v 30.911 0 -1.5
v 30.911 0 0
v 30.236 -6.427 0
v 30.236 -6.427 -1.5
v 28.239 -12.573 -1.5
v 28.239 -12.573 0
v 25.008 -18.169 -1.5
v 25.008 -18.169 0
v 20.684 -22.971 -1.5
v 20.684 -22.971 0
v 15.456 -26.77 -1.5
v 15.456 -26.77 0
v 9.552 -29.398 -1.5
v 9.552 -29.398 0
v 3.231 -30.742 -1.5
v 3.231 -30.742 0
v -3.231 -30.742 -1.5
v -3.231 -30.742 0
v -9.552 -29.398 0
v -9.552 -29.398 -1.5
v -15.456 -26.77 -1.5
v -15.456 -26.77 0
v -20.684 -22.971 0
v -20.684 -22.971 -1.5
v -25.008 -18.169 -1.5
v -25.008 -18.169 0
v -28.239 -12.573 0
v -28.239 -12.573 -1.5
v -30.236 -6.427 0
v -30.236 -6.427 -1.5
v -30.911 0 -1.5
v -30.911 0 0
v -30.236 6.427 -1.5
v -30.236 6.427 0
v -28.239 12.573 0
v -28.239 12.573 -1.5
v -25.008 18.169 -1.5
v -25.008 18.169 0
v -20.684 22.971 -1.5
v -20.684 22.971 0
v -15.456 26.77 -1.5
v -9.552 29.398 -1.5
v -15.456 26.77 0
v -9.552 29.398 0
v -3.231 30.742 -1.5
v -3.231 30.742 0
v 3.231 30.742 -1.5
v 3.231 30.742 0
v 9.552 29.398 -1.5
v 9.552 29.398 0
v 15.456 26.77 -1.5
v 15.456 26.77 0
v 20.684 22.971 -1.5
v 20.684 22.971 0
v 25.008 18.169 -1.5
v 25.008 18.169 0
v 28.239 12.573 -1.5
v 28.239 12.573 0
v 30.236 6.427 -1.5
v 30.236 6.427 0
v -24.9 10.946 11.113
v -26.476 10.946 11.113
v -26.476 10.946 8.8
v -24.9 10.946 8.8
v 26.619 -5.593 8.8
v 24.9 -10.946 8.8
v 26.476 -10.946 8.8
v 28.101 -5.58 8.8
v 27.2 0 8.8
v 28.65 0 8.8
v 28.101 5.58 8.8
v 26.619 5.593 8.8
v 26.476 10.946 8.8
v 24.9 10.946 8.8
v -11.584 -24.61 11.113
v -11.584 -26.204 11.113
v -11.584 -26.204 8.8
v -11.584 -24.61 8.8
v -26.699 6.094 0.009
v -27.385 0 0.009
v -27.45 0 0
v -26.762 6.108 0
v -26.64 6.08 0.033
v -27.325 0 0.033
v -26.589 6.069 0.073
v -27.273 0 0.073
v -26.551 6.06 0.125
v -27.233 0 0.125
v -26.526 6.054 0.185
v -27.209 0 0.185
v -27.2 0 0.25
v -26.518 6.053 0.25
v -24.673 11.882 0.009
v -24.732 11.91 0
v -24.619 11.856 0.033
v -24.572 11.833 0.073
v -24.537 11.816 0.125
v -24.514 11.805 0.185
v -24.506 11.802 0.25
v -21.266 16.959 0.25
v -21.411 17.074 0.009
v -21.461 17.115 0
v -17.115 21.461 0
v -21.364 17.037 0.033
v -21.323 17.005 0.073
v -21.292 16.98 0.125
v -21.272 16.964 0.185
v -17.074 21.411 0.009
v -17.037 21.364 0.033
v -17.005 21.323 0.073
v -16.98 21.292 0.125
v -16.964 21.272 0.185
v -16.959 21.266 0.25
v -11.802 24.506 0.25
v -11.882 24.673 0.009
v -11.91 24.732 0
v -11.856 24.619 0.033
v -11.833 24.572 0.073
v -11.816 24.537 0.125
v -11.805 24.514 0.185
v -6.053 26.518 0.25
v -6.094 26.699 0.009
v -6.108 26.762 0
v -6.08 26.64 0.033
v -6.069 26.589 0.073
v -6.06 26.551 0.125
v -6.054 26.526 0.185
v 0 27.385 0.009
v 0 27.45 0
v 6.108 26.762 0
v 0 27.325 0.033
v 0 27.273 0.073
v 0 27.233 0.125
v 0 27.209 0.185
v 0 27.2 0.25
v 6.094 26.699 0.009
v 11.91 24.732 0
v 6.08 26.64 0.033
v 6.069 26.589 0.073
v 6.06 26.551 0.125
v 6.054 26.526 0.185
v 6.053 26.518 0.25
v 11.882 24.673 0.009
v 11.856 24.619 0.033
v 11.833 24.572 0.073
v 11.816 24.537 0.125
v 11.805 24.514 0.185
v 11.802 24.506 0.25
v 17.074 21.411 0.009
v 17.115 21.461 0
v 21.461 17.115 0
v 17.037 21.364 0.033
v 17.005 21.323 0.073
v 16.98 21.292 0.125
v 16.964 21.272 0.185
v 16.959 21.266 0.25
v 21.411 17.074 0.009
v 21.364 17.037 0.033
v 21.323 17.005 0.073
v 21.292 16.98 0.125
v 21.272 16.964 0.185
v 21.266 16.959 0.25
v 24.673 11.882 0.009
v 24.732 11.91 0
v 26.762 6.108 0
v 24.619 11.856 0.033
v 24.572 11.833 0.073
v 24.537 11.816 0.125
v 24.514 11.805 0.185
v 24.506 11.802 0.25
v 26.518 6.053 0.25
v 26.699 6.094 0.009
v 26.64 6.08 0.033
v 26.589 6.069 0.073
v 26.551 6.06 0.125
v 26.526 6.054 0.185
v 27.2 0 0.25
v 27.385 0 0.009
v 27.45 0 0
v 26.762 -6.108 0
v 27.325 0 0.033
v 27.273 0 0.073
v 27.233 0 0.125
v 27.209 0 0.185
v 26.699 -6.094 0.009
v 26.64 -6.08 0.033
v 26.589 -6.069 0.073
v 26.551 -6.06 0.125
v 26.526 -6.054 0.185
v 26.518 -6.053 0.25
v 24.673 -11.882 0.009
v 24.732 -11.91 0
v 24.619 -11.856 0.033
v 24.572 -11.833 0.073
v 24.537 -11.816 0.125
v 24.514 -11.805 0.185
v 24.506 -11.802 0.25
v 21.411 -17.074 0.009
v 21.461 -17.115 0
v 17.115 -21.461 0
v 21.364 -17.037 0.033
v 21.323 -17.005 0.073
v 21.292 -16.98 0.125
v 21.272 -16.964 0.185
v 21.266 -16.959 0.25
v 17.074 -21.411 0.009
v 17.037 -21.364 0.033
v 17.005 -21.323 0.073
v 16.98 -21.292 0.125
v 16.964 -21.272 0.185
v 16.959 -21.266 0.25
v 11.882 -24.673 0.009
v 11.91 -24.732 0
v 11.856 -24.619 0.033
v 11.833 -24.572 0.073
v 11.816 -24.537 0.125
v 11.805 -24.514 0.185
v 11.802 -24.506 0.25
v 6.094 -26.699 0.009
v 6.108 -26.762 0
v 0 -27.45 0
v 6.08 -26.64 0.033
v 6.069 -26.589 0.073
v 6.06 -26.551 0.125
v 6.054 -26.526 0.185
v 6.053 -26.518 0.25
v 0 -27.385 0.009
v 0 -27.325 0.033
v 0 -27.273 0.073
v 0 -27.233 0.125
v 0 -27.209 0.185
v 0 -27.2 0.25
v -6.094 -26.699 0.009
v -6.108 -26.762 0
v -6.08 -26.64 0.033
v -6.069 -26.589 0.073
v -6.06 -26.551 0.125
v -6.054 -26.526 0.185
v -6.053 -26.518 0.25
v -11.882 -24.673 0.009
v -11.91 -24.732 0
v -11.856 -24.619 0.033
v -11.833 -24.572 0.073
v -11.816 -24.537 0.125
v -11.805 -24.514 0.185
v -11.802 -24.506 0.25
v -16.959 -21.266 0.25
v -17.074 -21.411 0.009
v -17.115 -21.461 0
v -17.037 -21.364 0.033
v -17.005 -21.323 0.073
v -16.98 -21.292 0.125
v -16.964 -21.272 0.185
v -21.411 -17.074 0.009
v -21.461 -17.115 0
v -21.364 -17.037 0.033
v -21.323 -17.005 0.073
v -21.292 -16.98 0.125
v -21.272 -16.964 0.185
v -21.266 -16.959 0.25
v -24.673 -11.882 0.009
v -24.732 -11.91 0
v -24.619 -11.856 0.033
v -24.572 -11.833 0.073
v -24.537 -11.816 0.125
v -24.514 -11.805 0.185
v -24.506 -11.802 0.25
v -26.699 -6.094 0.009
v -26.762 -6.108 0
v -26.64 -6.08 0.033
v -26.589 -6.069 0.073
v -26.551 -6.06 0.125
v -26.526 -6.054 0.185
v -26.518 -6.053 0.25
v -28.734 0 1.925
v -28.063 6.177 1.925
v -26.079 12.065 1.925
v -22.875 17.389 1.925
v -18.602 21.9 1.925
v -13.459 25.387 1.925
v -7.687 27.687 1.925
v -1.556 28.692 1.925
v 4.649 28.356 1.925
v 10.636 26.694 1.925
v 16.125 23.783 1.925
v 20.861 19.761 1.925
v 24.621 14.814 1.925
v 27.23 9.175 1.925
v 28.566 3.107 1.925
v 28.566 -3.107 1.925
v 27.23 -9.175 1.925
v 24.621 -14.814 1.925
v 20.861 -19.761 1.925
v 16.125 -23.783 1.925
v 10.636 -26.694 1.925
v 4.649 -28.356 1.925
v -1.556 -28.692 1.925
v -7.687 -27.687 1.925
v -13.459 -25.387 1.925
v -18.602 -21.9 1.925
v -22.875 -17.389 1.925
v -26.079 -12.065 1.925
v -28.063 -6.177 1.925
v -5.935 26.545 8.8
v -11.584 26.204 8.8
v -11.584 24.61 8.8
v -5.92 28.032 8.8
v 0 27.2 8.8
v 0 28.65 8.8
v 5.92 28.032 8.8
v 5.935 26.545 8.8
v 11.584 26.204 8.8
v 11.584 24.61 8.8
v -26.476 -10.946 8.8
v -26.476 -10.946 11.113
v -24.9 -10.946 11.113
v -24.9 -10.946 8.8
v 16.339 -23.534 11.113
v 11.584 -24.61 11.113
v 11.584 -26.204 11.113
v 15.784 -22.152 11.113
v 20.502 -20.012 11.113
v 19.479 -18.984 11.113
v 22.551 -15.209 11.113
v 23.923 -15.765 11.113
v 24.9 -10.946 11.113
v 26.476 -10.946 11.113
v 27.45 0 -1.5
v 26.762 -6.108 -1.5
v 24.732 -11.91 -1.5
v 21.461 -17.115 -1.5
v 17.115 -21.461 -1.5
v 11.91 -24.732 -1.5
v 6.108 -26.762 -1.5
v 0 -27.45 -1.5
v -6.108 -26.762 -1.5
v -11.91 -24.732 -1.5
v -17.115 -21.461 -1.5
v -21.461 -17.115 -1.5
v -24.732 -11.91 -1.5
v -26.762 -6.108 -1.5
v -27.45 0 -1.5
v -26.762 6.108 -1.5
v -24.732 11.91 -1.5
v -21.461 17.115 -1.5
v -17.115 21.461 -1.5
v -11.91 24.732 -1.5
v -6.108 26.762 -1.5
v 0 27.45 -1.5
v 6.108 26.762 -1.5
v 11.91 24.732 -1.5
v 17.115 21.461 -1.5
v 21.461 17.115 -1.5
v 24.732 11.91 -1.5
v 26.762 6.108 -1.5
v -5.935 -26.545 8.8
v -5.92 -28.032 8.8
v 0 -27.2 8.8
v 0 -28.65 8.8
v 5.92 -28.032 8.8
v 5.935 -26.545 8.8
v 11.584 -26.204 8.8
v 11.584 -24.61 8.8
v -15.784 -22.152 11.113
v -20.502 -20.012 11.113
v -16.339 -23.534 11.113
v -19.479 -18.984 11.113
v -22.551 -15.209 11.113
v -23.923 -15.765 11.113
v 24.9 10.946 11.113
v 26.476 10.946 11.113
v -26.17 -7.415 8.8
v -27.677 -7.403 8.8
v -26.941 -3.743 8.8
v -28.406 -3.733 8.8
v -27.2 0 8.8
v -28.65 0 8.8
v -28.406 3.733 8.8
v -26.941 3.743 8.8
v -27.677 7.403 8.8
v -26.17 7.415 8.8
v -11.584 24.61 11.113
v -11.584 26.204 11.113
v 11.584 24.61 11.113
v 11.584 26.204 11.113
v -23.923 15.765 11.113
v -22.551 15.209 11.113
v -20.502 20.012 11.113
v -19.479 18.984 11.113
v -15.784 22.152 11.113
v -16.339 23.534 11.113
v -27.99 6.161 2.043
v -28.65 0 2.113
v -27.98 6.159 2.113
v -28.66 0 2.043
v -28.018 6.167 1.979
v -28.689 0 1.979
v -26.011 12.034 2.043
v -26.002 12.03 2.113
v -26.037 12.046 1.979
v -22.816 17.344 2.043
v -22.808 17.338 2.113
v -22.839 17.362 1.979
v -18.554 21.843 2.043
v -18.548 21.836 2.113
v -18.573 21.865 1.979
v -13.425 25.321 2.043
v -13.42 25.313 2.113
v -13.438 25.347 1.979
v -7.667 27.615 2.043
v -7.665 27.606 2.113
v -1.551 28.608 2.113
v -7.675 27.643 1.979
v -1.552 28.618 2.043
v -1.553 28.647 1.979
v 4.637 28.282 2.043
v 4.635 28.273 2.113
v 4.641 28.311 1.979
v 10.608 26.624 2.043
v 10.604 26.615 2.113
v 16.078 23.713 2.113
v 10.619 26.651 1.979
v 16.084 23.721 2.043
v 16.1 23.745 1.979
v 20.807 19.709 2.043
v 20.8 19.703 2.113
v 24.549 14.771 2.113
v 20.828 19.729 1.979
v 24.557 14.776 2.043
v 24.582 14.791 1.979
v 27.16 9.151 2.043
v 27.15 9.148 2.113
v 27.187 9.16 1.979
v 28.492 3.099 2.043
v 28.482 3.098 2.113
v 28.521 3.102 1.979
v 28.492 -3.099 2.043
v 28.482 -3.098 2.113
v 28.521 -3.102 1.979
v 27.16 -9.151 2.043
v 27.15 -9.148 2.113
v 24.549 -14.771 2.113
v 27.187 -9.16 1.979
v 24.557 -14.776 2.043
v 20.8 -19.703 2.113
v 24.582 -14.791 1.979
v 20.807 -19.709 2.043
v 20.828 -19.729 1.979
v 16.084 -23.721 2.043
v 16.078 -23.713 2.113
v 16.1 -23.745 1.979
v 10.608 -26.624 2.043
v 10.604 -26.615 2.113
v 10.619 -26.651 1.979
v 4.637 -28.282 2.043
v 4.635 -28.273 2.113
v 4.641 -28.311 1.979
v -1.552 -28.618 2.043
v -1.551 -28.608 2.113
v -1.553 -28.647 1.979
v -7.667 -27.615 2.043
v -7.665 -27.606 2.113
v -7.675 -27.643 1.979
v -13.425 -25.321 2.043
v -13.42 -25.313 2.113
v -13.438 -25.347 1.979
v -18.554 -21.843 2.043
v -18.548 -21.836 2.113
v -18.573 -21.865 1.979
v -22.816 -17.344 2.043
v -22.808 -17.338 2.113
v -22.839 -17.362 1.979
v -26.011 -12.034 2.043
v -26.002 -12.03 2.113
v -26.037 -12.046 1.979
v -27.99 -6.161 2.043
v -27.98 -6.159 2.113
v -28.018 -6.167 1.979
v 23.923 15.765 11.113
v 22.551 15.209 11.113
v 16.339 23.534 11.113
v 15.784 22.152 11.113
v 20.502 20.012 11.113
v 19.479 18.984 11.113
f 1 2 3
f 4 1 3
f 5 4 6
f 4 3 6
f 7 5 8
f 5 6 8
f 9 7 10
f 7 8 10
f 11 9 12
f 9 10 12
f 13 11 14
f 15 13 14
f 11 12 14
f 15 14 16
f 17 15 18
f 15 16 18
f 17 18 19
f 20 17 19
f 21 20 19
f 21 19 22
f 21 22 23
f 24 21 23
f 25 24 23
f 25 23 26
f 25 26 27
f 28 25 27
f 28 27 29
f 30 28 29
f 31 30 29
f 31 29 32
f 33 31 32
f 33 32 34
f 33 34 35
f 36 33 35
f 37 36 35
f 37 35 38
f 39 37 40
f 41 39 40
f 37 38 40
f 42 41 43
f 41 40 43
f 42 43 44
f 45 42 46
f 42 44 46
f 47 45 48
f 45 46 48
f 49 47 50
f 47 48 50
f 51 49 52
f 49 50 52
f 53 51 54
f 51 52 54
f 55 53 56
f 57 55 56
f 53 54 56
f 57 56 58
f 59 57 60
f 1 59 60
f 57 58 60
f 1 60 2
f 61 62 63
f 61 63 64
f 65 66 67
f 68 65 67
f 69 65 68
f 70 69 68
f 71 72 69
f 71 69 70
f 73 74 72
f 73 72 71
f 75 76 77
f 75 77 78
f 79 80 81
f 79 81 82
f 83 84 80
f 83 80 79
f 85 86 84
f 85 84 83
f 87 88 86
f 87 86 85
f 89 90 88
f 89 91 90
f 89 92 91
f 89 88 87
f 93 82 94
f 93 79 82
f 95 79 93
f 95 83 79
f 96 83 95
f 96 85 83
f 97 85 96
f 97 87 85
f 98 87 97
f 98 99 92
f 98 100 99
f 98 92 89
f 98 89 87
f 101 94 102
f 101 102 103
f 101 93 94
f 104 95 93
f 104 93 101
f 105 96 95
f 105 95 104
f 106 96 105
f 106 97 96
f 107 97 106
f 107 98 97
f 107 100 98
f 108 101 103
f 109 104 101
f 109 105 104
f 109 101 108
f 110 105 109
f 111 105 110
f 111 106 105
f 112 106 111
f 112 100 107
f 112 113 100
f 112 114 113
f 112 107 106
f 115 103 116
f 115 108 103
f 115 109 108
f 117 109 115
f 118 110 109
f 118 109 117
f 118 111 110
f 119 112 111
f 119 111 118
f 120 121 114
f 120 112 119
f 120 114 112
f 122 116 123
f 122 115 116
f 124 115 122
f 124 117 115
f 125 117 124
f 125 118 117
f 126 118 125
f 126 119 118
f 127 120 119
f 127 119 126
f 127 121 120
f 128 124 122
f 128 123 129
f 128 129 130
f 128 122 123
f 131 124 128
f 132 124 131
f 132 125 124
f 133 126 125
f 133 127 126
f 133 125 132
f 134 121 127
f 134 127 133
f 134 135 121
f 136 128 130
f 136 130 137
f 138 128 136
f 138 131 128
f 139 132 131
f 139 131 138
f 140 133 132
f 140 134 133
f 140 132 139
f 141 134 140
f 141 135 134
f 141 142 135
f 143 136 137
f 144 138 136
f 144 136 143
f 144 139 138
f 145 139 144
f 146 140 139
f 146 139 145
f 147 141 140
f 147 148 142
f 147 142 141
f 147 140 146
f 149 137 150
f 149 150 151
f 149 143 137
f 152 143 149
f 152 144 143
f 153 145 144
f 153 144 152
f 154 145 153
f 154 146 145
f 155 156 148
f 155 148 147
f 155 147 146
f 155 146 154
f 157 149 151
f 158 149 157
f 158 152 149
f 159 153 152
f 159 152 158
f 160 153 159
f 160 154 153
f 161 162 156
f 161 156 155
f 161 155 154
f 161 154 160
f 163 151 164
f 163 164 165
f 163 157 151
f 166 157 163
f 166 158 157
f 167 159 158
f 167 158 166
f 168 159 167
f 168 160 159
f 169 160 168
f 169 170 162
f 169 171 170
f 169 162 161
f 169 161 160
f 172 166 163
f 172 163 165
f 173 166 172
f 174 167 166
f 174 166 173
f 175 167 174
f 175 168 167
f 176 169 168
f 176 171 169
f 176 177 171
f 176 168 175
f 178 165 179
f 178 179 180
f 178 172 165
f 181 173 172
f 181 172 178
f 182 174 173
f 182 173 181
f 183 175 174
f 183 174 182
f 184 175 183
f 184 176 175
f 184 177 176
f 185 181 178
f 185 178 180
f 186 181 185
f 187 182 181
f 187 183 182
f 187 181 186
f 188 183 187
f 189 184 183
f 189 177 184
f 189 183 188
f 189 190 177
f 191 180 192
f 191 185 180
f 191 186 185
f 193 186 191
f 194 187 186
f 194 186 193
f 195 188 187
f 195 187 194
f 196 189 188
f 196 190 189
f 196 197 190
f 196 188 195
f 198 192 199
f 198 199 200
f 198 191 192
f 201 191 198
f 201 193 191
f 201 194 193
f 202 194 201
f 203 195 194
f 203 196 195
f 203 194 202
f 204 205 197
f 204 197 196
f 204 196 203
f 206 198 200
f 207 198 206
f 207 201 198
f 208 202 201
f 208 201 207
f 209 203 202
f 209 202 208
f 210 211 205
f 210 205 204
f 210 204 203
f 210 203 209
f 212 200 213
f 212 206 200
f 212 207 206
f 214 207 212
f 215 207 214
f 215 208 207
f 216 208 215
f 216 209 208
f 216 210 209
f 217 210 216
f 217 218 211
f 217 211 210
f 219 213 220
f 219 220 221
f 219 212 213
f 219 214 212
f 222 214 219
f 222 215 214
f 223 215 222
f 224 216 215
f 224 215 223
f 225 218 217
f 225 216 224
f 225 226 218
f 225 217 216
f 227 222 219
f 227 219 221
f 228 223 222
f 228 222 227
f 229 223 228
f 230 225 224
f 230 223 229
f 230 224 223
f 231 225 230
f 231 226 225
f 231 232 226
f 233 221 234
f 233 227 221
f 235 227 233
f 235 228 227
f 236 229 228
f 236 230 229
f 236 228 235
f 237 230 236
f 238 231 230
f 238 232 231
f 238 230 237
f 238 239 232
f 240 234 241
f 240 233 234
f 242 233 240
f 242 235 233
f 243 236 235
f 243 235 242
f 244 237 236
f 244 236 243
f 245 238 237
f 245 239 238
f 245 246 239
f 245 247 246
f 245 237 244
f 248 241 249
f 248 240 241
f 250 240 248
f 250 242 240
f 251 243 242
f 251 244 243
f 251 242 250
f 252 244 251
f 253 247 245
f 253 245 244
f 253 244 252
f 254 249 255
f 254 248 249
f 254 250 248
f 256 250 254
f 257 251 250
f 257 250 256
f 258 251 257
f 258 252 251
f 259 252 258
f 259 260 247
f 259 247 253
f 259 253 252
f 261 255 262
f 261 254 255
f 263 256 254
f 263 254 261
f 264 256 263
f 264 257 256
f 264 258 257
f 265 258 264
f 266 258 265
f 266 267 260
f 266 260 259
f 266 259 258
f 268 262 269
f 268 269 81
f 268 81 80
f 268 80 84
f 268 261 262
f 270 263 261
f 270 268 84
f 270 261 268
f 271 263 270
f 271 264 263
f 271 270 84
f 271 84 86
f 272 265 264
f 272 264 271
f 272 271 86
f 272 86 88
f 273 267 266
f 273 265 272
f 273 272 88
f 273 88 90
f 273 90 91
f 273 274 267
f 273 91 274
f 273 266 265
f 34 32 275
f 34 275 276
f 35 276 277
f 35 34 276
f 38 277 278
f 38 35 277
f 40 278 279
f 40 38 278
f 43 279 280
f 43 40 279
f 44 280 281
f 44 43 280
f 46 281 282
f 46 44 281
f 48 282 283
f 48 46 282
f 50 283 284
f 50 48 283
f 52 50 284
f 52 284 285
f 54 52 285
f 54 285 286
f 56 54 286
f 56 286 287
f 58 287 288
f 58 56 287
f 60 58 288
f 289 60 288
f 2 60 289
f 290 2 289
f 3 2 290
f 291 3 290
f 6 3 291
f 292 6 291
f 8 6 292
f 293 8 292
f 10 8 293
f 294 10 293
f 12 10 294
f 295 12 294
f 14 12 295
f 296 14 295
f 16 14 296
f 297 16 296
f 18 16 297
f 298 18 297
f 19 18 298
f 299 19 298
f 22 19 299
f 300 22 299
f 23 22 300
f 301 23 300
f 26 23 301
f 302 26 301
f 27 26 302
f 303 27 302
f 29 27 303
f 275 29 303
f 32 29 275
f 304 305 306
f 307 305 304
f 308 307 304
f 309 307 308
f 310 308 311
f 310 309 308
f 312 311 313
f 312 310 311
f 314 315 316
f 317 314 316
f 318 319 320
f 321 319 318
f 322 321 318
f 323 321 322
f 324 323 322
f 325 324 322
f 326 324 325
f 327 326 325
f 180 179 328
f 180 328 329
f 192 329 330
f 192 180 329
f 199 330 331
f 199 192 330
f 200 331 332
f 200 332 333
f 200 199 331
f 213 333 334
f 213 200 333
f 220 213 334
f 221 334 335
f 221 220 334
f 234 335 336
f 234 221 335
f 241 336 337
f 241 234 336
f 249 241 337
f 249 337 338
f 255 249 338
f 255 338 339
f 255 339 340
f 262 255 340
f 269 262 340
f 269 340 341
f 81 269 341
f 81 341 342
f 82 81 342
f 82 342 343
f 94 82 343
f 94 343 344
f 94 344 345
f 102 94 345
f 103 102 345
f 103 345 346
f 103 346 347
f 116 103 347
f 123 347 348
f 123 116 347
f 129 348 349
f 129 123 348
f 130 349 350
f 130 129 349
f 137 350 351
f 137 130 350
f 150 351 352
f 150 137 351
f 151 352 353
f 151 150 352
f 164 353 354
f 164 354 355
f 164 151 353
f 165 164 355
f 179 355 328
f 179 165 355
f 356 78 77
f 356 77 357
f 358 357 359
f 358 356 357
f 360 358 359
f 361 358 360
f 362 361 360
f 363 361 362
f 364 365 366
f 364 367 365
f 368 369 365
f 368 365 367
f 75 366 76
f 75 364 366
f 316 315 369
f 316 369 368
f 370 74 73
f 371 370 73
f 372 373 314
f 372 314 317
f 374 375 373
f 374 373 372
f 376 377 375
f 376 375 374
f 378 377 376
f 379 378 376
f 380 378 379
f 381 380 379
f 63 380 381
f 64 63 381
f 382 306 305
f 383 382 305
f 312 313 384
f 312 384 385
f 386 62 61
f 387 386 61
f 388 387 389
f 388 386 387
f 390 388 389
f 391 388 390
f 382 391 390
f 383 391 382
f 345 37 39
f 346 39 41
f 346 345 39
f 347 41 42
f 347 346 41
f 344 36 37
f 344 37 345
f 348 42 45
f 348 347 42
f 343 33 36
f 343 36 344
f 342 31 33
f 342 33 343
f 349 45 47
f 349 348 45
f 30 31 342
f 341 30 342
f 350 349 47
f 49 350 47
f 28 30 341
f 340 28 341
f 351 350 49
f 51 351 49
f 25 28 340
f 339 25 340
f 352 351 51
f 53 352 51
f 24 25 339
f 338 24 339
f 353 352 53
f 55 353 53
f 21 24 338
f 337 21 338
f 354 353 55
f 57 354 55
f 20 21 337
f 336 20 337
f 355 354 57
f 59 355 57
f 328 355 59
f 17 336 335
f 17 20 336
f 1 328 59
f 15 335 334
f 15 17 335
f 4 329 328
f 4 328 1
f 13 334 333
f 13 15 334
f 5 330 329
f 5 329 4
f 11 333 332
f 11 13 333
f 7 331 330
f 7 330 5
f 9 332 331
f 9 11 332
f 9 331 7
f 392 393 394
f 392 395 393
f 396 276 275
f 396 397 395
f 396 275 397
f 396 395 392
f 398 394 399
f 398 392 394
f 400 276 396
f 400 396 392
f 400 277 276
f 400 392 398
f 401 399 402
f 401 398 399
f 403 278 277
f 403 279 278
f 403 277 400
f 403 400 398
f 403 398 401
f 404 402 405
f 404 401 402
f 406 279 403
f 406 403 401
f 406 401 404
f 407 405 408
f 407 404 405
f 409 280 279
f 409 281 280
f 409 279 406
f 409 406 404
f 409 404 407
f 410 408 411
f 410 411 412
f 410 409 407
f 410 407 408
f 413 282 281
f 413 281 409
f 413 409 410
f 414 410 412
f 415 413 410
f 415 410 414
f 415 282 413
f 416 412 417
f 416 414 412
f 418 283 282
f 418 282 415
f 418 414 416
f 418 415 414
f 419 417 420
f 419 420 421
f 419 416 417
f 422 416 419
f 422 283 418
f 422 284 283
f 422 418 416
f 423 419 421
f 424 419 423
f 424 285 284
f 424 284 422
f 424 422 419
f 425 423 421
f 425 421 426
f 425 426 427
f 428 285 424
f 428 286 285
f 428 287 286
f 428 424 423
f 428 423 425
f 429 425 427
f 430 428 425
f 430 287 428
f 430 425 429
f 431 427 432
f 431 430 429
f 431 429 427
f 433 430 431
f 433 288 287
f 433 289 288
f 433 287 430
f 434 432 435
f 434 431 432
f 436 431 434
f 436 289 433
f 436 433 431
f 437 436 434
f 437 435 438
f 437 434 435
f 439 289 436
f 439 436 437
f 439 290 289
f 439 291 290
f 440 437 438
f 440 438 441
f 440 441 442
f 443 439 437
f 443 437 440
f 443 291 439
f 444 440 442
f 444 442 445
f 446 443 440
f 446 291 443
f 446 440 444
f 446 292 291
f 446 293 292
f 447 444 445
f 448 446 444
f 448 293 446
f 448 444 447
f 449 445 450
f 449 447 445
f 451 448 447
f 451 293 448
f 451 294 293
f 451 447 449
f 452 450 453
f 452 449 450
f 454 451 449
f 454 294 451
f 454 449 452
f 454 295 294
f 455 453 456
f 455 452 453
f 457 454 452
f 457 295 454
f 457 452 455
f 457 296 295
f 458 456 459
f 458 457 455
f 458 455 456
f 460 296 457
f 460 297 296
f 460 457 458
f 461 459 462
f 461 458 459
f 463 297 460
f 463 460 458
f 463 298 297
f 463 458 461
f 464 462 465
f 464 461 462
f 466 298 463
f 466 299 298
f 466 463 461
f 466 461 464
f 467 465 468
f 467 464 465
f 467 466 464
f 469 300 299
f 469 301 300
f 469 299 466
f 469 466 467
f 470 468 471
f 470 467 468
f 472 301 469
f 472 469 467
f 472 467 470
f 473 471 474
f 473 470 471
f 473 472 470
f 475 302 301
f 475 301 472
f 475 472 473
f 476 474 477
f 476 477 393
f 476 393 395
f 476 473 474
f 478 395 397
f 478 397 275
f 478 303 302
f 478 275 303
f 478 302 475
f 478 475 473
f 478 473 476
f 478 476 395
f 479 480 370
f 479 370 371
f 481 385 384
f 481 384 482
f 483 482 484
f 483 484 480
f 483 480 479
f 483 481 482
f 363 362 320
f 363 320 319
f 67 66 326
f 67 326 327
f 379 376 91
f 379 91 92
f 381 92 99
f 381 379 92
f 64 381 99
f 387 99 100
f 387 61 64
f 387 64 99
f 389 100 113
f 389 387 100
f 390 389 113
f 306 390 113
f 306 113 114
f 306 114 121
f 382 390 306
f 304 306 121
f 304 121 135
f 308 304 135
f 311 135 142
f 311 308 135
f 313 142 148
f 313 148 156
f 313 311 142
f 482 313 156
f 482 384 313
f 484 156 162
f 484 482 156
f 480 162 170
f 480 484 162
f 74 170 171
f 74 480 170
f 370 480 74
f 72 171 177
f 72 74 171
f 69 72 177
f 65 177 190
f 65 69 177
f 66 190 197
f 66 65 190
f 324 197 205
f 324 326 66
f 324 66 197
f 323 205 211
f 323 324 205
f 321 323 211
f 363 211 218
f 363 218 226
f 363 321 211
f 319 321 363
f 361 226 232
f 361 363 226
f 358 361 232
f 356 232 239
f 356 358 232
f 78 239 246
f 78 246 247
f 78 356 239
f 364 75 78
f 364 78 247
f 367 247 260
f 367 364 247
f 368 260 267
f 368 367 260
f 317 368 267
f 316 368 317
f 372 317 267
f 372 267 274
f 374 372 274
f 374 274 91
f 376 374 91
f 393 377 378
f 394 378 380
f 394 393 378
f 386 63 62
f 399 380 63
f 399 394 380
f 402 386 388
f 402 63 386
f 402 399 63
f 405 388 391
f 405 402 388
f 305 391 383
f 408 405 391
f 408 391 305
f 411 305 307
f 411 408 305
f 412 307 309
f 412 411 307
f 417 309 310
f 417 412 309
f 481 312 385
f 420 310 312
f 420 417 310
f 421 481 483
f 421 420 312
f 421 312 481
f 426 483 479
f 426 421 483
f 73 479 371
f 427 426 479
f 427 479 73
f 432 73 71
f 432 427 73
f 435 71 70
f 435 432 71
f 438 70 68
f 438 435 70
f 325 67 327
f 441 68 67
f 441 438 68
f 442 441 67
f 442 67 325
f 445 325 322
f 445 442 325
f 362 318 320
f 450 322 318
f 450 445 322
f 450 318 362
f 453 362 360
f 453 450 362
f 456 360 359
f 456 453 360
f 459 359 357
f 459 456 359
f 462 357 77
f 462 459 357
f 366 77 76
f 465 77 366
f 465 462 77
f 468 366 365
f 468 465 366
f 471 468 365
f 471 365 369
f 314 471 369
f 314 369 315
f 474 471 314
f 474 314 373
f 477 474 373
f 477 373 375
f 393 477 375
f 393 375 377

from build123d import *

# Parameters (mm, degrees)
F3_W        = 23.168018
F3_H        = 27.206479
F3_W_2      = 23.380567
F3_H_2      = 21.892714
F4_DEPTH    = 4
F1_FACE_R   = 30.911156
F1_FACE_R_2 = 27.45
F5_DEPTH    = 1.5


with BuildPart() as f1:
    # F0 (on Front) → F1 (revolve)
    with BuildSketch(Plane.XZ):
        with BuildLine():
            Line((-28.734368, 1.925376), (-30.911156, 0))
            Line((-30.911156, 0), (-27.45, 0))
            ThreePointArc((-27.45, 0), (-27.273223, 0.073223), (-27.2, 0.25))
            Line((-27.2, 0.25), (-27.2, 5))
            Line((-27.2, 5), (-27.2, 9.999887))
            Line((-27.2, 9.999887), (-27.2, 11.112636))
            Line((-27.2, 11.112636), (-28.65, 11.112636))
            Line((-28.65, 11.112636), (-28.65, 2.112636))
            ThreePointArc((-28.65, 2.112636), (-28.672066, 2.009942), (-28.734368, 1.925376))
        make_face()
    revolve(axis=Axis((0, 0, 10.43564), (0, 0, -1)))

    # F3 (on offset) → F4 (cut)
    with BuildSketch(Plane.XY.offset(8.8)):
        with Locations((0, 24.549596)):
            Rectangle(F3_W, F3_H)
        with Locations((-23.274293, 0)):
            Rectangle(F3_W_2, F3_H_2)
        with Locations((23.274293, 0)):
            Rectangle(F3_W_2, F3_H_2)
        with Locations((0, -24.549596)):
            Rectangle(F3_W, F3_H)
    extrude(amount=F4_DEPTH, mode=Mode.SUBTRACT)

    # F1_face (on face) → F5 (join)
    with BuildSketch(Plane(origin=(0, 0, 0), x_dir=(1, 0, 0), z_dir=(0, 0, -1))):
        Circle(F1_FACE_R)
        Circle(F1_FACE_R_2, mode=Mode.SUBTRACT)
    extrude(amount=F5_DEPTH)


solid = f1.part
